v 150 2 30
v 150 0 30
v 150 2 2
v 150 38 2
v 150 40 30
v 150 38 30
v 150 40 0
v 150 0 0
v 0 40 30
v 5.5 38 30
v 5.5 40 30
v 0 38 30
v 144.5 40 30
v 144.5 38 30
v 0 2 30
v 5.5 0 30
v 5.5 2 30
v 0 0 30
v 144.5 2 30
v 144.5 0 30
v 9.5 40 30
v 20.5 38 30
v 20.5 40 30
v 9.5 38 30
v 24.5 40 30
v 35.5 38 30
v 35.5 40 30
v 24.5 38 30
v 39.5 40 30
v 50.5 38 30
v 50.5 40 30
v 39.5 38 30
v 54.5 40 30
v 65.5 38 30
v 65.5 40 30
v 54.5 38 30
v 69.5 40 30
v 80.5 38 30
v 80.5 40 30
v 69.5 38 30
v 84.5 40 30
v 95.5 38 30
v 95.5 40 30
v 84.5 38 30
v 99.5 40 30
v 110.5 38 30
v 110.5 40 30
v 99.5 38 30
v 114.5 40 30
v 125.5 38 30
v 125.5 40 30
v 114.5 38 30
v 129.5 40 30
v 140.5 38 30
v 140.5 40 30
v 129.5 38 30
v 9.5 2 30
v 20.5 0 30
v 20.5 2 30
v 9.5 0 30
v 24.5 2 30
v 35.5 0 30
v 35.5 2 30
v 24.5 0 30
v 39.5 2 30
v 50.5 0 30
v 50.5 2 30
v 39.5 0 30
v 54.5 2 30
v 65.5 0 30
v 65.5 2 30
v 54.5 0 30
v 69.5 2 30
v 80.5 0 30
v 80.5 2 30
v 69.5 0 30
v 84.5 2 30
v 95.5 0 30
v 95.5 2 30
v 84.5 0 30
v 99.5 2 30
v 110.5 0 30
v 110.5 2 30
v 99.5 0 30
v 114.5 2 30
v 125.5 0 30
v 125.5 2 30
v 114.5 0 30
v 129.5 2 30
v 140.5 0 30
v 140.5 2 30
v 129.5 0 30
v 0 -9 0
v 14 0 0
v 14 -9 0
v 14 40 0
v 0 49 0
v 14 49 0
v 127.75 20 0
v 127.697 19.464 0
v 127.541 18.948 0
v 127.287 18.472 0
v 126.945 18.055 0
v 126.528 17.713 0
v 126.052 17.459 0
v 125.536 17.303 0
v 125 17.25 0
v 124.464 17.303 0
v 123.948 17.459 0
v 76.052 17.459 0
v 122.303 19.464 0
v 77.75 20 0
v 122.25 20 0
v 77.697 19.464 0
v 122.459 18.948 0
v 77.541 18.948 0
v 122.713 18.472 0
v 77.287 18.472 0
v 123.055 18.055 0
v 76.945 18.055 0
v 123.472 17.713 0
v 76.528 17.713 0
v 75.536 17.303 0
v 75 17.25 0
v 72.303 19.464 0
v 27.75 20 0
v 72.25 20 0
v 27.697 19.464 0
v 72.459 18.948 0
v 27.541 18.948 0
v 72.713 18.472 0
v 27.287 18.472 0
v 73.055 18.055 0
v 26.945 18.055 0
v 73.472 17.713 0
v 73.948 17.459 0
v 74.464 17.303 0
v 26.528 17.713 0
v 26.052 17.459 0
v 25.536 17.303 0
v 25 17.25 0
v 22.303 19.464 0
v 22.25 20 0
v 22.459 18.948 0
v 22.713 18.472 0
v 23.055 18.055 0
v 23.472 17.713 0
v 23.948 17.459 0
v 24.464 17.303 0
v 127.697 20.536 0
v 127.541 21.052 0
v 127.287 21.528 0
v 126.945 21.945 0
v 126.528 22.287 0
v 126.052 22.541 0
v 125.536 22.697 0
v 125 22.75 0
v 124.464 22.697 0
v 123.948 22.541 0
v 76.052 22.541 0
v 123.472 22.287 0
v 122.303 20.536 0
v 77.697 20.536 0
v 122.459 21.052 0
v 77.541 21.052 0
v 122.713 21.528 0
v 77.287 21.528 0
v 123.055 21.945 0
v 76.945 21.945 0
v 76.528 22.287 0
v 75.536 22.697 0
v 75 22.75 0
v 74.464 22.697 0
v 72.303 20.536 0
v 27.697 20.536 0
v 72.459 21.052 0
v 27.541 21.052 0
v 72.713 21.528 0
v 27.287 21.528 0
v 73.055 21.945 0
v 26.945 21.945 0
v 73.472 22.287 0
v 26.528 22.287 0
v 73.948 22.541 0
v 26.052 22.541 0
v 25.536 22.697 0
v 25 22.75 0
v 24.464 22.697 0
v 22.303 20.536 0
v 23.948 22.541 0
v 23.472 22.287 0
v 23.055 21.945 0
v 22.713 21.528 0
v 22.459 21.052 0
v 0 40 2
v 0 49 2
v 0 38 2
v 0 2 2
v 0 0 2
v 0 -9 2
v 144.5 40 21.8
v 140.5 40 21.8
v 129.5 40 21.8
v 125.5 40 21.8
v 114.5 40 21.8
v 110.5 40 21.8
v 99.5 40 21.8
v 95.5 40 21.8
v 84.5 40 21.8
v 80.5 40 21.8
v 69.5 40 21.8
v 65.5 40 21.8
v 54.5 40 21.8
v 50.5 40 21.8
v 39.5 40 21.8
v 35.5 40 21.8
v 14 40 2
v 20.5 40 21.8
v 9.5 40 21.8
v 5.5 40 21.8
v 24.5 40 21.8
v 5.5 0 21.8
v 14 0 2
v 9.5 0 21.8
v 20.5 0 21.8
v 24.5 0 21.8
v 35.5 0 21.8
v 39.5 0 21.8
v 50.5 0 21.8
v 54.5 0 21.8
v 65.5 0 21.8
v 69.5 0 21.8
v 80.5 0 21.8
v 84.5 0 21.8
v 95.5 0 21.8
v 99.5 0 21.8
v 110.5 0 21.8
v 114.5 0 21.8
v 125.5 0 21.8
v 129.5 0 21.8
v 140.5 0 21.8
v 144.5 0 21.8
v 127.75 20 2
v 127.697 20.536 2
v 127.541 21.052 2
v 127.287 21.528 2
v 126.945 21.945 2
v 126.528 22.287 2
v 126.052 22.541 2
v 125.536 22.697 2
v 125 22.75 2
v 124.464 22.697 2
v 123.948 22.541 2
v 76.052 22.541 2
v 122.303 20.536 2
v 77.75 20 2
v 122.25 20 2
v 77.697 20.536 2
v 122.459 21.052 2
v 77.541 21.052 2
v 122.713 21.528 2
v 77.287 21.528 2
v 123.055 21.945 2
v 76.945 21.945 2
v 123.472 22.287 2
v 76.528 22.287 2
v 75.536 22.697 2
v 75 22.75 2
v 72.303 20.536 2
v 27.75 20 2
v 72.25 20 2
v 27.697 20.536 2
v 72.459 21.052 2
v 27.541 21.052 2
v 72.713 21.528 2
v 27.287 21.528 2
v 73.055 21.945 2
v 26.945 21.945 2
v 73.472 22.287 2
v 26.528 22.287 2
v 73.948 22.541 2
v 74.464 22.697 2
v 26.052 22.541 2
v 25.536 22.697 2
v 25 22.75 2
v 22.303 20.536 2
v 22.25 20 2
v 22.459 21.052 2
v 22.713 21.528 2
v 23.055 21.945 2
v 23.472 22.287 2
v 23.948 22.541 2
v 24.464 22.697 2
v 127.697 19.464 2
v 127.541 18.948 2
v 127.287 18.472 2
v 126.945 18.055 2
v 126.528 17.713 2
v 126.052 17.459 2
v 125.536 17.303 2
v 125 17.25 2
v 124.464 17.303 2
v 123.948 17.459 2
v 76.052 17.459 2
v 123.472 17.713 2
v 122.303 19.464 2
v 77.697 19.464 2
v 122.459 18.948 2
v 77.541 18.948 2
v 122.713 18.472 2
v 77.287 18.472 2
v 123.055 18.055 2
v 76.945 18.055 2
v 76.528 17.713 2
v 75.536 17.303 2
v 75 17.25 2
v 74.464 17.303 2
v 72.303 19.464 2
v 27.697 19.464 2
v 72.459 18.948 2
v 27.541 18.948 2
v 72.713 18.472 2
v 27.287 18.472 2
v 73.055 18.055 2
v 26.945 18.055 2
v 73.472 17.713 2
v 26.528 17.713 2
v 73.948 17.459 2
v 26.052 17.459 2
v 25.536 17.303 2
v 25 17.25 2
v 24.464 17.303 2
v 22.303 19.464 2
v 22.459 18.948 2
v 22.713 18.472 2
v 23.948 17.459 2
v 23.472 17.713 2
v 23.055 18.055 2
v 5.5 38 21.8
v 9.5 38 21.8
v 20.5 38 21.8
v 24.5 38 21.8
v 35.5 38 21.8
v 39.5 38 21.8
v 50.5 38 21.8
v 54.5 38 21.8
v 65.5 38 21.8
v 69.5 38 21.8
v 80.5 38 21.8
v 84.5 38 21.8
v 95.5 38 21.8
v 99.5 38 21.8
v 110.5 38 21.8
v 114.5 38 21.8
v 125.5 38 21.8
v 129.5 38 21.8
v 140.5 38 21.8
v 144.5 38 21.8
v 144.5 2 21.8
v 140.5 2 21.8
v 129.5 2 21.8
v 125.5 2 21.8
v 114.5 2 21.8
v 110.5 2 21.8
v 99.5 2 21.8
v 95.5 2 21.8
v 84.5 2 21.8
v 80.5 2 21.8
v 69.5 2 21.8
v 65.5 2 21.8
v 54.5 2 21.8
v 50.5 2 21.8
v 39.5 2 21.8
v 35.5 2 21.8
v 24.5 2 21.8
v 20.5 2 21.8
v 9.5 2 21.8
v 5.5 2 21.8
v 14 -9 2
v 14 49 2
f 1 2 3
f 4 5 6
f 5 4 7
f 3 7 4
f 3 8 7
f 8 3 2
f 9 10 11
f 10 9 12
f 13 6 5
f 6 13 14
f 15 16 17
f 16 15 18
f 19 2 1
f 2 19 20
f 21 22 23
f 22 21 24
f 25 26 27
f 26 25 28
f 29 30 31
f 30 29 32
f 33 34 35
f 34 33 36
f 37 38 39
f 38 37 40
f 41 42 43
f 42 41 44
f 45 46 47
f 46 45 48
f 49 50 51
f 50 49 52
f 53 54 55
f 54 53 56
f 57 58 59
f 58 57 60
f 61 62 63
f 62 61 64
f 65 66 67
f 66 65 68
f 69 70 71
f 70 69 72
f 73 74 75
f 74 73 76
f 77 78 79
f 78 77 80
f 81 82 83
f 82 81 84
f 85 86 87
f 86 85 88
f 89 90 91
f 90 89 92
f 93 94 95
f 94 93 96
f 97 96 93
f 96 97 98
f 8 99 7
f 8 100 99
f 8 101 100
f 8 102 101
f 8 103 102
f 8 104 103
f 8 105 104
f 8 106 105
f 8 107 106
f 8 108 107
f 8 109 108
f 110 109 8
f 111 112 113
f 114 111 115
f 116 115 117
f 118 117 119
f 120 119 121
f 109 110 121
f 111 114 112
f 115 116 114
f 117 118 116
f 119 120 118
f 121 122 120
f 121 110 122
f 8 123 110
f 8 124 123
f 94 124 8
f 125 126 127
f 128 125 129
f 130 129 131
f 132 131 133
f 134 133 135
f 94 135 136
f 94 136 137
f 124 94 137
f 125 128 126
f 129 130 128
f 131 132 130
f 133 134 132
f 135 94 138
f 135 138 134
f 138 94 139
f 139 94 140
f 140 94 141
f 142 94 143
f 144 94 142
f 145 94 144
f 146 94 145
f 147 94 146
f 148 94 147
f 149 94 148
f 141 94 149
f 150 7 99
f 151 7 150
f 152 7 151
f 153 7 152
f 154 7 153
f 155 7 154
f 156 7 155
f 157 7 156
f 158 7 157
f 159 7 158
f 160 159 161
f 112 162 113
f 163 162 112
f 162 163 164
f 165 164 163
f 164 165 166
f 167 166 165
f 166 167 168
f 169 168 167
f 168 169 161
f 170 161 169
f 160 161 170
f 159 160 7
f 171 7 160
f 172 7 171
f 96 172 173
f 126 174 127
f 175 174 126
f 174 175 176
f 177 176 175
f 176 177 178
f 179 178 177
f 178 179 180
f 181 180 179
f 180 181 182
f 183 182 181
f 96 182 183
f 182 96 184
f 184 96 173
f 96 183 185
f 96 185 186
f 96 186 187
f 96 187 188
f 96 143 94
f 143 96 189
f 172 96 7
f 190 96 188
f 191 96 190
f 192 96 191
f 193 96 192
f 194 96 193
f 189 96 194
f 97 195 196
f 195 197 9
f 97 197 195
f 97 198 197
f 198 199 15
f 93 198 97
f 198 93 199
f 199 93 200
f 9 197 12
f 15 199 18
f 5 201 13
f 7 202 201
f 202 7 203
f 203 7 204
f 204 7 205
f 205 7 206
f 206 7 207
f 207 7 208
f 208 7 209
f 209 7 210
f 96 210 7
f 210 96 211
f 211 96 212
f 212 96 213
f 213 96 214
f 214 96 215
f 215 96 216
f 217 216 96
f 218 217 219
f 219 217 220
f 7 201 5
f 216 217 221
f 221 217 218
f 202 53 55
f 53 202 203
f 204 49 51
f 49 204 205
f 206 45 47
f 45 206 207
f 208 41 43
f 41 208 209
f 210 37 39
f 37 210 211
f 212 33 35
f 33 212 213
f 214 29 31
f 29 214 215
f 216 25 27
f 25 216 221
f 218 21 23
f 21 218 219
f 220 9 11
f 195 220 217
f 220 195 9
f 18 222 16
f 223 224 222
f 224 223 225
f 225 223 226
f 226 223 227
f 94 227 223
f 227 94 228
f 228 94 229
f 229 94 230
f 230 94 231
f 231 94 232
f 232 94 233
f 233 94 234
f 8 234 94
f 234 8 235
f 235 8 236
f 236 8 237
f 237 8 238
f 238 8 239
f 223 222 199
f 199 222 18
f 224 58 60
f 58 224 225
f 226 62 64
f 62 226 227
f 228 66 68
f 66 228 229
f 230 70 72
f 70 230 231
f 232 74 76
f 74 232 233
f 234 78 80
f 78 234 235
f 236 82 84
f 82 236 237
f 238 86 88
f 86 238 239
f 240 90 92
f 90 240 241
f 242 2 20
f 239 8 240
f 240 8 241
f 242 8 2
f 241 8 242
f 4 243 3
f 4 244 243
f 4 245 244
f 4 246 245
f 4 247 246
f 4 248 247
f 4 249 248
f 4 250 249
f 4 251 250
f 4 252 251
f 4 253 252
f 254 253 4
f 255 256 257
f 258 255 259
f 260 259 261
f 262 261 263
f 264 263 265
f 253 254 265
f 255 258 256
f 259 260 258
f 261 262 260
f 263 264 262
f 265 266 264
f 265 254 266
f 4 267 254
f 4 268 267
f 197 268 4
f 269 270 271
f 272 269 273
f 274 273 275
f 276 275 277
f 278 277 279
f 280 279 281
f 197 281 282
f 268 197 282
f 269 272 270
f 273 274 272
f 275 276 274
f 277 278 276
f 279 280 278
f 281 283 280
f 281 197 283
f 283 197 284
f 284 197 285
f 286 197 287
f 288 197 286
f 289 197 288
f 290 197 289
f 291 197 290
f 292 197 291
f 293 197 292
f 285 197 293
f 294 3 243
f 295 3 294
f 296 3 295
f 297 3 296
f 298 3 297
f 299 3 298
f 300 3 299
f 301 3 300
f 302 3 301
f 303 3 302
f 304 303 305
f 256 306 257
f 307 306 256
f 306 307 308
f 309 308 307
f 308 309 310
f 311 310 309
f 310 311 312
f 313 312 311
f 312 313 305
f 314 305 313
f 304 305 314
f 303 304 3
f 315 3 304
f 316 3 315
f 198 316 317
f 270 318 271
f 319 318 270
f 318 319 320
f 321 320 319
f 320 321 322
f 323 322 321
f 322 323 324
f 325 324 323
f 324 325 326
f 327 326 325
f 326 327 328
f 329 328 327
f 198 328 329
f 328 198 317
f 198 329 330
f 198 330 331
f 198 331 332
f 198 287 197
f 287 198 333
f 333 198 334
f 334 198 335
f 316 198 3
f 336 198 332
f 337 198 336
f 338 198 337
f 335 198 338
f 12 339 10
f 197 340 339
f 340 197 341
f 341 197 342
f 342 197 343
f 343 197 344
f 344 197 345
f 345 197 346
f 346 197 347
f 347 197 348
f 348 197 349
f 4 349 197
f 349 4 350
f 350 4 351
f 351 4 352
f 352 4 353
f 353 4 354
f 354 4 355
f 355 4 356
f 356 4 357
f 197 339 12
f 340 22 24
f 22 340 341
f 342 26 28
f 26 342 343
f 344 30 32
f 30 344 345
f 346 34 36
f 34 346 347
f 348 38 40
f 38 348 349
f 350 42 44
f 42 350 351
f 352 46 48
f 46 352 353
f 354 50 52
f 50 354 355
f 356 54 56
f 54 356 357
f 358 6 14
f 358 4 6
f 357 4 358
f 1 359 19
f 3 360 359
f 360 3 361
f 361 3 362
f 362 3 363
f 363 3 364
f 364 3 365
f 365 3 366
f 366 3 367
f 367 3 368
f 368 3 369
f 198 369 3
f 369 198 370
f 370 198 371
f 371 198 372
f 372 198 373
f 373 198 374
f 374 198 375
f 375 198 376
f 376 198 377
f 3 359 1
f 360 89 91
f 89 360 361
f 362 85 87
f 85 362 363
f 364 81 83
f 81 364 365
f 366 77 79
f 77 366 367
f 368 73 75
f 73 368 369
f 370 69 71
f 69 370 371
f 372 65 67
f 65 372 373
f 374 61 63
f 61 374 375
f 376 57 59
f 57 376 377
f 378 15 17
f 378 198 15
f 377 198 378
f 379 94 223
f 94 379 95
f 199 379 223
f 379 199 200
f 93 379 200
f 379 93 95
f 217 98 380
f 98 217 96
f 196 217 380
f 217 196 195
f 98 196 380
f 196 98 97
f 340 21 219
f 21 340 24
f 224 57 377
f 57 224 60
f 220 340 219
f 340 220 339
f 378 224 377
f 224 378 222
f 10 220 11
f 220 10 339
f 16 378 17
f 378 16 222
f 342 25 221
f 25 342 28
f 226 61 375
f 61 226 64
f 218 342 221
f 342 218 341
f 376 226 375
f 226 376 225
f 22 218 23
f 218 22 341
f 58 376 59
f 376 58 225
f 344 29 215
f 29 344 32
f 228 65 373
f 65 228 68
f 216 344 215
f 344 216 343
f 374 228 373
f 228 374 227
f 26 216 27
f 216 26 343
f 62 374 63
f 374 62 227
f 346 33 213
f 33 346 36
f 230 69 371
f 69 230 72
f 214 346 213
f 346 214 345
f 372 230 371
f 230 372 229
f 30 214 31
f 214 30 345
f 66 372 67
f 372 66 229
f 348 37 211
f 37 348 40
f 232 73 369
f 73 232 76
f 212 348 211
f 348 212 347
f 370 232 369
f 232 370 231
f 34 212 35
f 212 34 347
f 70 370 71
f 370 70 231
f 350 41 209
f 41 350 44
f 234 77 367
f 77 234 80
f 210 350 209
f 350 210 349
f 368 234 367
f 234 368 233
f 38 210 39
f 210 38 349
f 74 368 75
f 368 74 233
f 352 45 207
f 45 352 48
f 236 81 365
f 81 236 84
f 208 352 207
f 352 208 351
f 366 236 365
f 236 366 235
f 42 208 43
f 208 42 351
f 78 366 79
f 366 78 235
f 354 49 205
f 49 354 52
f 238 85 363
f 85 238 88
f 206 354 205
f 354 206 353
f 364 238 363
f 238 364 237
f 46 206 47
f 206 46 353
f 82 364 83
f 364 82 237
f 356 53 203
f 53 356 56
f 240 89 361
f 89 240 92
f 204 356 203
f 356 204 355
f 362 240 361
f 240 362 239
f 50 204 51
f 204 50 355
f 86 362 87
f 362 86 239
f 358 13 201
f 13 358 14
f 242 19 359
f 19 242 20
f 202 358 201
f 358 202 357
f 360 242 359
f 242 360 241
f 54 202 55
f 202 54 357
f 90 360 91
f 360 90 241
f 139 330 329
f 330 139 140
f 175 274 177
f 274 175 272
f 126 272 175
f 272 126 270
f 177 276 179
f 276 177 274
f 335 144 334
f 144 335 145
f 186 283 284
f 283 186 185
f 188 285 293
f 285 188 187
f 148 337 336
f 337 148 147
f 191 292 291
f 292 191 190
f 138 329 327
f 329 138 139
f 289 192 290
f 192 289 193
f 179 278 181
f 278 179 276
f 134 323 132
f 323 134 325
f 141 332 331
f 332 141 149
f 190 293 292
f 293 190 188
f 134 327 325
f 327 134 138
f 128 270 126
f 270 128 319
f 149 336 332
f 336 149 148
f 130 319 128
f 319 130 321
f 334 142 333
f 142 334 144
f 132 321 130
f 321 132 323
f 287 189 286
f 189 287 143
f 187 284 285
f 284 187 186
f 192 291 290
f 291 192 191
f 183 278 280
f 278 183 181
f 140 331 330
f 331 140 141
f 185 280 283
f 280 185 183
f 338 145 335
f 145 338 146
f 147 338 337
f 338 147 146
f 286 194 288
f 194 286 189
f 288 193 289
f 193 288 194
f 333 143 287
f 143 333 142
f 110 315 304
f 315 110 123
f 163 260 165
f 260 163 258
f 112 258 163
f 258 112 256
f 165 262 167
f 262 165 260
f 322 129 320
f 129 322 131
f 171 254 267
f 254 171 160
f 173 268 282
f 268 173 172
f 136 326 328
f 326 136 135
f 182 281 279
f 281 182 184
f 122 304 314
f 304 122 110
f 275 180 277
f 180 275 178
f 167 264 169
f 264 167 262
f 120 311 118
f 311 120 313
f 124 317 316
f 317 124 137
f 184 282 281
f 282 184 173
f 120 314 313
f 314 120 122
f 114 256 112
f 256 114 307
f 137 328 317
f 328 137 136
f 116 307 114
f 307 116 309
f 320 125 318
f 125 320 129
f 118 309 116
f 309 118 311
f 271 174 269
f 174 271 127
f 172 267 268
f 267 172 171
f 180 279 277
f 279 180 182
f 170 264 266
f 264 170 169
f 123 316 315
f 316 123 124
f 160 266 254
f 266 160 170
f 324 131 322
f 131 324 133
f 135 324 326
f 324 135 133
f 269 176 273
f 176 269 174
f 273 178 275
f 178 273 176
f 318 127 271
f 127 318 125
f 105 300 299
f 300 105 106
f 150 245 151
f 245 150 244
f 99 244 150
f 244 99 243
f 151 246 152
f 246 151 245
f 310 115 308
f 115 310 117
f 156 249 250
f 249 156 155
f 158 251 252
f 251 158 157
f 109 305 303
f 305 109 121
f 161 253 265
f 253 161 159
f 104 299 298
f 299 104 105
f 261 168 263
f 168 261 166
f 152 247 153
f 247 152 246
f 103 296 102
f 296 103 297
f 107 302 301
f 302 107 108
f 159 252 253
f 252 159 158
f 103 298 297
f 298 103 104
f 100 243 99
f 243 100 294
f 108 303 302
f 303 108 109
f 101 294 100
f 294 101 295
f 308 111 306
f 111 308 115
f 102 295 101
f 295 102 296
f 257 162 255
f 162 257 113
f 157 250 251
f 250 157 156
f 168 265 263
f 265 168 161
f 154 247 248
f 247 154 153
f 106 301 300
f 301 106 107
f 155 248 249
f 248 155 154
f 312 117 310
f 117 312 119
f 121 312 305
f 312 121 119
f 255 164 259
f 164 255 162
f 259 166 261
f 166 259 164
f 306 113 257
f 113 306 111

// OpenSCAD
$fn = 32;

// ----------------------------------------------------------------------
// Cable duct: 150 x 40 x 30 mm, 10 fingers
// ----------------------------------------------------------------------

// --- parameters (mm) ---
duct_len = 150;           // duct length, X
duct_w = 40;              // duct width, Y
duct_h = 30;              // duct height, Z
wall_t = 2;               // side wall thickness
floor_t = 2;              // floor thickness
slot_w = 4;               // finger slot width
slot_h = 19.8;            // finger slot height
fingers = 10;             // number of finger slots per side
pitch = 15;               // finger pitch
hole_d = 5.5;             // floor mounting hole
hole_n = 3;               // mounting holes in the floor
ear_w = 10;               // mounting ear width
ear_l = 14;               // mounting ear length

module shell() {
  difference() {
    cube([duct_len, duct_w, duct_h]);
    /* open top channel */
    translate([-wall_t - 1, wall_t, floor_t])
      cube([duct_len + 2 * wall_t + 2, duct_w - 2 * wall_t, duct_h + 1]);
  }
}

module ears() {
  translate([0, -ear_w + 1, 0]) cube([ear_l, ear_w, floor_t]);
  translate([0, duct_w - 1, 0]) cube([ear_l, ear_w, floor_t]);
}

difference() {
  union() {
    shell();
    ears();
  }
  /* finger slots cut through both side walls */
  for (i = [0 : fingers - 1]) translate([pitch / 2 + i * pitch - slot_w / 2, -1, floor_t + slot_h]) cube([slot_w, duct_w + 2, duct_h]);
  for (i = [0 : hole_n - 1]) translate([(duct_len / hole_n) * (i + 0.5), duct_w / 2, -1]) cylinder(h = floor_t + 2, d = hole_d);
}
